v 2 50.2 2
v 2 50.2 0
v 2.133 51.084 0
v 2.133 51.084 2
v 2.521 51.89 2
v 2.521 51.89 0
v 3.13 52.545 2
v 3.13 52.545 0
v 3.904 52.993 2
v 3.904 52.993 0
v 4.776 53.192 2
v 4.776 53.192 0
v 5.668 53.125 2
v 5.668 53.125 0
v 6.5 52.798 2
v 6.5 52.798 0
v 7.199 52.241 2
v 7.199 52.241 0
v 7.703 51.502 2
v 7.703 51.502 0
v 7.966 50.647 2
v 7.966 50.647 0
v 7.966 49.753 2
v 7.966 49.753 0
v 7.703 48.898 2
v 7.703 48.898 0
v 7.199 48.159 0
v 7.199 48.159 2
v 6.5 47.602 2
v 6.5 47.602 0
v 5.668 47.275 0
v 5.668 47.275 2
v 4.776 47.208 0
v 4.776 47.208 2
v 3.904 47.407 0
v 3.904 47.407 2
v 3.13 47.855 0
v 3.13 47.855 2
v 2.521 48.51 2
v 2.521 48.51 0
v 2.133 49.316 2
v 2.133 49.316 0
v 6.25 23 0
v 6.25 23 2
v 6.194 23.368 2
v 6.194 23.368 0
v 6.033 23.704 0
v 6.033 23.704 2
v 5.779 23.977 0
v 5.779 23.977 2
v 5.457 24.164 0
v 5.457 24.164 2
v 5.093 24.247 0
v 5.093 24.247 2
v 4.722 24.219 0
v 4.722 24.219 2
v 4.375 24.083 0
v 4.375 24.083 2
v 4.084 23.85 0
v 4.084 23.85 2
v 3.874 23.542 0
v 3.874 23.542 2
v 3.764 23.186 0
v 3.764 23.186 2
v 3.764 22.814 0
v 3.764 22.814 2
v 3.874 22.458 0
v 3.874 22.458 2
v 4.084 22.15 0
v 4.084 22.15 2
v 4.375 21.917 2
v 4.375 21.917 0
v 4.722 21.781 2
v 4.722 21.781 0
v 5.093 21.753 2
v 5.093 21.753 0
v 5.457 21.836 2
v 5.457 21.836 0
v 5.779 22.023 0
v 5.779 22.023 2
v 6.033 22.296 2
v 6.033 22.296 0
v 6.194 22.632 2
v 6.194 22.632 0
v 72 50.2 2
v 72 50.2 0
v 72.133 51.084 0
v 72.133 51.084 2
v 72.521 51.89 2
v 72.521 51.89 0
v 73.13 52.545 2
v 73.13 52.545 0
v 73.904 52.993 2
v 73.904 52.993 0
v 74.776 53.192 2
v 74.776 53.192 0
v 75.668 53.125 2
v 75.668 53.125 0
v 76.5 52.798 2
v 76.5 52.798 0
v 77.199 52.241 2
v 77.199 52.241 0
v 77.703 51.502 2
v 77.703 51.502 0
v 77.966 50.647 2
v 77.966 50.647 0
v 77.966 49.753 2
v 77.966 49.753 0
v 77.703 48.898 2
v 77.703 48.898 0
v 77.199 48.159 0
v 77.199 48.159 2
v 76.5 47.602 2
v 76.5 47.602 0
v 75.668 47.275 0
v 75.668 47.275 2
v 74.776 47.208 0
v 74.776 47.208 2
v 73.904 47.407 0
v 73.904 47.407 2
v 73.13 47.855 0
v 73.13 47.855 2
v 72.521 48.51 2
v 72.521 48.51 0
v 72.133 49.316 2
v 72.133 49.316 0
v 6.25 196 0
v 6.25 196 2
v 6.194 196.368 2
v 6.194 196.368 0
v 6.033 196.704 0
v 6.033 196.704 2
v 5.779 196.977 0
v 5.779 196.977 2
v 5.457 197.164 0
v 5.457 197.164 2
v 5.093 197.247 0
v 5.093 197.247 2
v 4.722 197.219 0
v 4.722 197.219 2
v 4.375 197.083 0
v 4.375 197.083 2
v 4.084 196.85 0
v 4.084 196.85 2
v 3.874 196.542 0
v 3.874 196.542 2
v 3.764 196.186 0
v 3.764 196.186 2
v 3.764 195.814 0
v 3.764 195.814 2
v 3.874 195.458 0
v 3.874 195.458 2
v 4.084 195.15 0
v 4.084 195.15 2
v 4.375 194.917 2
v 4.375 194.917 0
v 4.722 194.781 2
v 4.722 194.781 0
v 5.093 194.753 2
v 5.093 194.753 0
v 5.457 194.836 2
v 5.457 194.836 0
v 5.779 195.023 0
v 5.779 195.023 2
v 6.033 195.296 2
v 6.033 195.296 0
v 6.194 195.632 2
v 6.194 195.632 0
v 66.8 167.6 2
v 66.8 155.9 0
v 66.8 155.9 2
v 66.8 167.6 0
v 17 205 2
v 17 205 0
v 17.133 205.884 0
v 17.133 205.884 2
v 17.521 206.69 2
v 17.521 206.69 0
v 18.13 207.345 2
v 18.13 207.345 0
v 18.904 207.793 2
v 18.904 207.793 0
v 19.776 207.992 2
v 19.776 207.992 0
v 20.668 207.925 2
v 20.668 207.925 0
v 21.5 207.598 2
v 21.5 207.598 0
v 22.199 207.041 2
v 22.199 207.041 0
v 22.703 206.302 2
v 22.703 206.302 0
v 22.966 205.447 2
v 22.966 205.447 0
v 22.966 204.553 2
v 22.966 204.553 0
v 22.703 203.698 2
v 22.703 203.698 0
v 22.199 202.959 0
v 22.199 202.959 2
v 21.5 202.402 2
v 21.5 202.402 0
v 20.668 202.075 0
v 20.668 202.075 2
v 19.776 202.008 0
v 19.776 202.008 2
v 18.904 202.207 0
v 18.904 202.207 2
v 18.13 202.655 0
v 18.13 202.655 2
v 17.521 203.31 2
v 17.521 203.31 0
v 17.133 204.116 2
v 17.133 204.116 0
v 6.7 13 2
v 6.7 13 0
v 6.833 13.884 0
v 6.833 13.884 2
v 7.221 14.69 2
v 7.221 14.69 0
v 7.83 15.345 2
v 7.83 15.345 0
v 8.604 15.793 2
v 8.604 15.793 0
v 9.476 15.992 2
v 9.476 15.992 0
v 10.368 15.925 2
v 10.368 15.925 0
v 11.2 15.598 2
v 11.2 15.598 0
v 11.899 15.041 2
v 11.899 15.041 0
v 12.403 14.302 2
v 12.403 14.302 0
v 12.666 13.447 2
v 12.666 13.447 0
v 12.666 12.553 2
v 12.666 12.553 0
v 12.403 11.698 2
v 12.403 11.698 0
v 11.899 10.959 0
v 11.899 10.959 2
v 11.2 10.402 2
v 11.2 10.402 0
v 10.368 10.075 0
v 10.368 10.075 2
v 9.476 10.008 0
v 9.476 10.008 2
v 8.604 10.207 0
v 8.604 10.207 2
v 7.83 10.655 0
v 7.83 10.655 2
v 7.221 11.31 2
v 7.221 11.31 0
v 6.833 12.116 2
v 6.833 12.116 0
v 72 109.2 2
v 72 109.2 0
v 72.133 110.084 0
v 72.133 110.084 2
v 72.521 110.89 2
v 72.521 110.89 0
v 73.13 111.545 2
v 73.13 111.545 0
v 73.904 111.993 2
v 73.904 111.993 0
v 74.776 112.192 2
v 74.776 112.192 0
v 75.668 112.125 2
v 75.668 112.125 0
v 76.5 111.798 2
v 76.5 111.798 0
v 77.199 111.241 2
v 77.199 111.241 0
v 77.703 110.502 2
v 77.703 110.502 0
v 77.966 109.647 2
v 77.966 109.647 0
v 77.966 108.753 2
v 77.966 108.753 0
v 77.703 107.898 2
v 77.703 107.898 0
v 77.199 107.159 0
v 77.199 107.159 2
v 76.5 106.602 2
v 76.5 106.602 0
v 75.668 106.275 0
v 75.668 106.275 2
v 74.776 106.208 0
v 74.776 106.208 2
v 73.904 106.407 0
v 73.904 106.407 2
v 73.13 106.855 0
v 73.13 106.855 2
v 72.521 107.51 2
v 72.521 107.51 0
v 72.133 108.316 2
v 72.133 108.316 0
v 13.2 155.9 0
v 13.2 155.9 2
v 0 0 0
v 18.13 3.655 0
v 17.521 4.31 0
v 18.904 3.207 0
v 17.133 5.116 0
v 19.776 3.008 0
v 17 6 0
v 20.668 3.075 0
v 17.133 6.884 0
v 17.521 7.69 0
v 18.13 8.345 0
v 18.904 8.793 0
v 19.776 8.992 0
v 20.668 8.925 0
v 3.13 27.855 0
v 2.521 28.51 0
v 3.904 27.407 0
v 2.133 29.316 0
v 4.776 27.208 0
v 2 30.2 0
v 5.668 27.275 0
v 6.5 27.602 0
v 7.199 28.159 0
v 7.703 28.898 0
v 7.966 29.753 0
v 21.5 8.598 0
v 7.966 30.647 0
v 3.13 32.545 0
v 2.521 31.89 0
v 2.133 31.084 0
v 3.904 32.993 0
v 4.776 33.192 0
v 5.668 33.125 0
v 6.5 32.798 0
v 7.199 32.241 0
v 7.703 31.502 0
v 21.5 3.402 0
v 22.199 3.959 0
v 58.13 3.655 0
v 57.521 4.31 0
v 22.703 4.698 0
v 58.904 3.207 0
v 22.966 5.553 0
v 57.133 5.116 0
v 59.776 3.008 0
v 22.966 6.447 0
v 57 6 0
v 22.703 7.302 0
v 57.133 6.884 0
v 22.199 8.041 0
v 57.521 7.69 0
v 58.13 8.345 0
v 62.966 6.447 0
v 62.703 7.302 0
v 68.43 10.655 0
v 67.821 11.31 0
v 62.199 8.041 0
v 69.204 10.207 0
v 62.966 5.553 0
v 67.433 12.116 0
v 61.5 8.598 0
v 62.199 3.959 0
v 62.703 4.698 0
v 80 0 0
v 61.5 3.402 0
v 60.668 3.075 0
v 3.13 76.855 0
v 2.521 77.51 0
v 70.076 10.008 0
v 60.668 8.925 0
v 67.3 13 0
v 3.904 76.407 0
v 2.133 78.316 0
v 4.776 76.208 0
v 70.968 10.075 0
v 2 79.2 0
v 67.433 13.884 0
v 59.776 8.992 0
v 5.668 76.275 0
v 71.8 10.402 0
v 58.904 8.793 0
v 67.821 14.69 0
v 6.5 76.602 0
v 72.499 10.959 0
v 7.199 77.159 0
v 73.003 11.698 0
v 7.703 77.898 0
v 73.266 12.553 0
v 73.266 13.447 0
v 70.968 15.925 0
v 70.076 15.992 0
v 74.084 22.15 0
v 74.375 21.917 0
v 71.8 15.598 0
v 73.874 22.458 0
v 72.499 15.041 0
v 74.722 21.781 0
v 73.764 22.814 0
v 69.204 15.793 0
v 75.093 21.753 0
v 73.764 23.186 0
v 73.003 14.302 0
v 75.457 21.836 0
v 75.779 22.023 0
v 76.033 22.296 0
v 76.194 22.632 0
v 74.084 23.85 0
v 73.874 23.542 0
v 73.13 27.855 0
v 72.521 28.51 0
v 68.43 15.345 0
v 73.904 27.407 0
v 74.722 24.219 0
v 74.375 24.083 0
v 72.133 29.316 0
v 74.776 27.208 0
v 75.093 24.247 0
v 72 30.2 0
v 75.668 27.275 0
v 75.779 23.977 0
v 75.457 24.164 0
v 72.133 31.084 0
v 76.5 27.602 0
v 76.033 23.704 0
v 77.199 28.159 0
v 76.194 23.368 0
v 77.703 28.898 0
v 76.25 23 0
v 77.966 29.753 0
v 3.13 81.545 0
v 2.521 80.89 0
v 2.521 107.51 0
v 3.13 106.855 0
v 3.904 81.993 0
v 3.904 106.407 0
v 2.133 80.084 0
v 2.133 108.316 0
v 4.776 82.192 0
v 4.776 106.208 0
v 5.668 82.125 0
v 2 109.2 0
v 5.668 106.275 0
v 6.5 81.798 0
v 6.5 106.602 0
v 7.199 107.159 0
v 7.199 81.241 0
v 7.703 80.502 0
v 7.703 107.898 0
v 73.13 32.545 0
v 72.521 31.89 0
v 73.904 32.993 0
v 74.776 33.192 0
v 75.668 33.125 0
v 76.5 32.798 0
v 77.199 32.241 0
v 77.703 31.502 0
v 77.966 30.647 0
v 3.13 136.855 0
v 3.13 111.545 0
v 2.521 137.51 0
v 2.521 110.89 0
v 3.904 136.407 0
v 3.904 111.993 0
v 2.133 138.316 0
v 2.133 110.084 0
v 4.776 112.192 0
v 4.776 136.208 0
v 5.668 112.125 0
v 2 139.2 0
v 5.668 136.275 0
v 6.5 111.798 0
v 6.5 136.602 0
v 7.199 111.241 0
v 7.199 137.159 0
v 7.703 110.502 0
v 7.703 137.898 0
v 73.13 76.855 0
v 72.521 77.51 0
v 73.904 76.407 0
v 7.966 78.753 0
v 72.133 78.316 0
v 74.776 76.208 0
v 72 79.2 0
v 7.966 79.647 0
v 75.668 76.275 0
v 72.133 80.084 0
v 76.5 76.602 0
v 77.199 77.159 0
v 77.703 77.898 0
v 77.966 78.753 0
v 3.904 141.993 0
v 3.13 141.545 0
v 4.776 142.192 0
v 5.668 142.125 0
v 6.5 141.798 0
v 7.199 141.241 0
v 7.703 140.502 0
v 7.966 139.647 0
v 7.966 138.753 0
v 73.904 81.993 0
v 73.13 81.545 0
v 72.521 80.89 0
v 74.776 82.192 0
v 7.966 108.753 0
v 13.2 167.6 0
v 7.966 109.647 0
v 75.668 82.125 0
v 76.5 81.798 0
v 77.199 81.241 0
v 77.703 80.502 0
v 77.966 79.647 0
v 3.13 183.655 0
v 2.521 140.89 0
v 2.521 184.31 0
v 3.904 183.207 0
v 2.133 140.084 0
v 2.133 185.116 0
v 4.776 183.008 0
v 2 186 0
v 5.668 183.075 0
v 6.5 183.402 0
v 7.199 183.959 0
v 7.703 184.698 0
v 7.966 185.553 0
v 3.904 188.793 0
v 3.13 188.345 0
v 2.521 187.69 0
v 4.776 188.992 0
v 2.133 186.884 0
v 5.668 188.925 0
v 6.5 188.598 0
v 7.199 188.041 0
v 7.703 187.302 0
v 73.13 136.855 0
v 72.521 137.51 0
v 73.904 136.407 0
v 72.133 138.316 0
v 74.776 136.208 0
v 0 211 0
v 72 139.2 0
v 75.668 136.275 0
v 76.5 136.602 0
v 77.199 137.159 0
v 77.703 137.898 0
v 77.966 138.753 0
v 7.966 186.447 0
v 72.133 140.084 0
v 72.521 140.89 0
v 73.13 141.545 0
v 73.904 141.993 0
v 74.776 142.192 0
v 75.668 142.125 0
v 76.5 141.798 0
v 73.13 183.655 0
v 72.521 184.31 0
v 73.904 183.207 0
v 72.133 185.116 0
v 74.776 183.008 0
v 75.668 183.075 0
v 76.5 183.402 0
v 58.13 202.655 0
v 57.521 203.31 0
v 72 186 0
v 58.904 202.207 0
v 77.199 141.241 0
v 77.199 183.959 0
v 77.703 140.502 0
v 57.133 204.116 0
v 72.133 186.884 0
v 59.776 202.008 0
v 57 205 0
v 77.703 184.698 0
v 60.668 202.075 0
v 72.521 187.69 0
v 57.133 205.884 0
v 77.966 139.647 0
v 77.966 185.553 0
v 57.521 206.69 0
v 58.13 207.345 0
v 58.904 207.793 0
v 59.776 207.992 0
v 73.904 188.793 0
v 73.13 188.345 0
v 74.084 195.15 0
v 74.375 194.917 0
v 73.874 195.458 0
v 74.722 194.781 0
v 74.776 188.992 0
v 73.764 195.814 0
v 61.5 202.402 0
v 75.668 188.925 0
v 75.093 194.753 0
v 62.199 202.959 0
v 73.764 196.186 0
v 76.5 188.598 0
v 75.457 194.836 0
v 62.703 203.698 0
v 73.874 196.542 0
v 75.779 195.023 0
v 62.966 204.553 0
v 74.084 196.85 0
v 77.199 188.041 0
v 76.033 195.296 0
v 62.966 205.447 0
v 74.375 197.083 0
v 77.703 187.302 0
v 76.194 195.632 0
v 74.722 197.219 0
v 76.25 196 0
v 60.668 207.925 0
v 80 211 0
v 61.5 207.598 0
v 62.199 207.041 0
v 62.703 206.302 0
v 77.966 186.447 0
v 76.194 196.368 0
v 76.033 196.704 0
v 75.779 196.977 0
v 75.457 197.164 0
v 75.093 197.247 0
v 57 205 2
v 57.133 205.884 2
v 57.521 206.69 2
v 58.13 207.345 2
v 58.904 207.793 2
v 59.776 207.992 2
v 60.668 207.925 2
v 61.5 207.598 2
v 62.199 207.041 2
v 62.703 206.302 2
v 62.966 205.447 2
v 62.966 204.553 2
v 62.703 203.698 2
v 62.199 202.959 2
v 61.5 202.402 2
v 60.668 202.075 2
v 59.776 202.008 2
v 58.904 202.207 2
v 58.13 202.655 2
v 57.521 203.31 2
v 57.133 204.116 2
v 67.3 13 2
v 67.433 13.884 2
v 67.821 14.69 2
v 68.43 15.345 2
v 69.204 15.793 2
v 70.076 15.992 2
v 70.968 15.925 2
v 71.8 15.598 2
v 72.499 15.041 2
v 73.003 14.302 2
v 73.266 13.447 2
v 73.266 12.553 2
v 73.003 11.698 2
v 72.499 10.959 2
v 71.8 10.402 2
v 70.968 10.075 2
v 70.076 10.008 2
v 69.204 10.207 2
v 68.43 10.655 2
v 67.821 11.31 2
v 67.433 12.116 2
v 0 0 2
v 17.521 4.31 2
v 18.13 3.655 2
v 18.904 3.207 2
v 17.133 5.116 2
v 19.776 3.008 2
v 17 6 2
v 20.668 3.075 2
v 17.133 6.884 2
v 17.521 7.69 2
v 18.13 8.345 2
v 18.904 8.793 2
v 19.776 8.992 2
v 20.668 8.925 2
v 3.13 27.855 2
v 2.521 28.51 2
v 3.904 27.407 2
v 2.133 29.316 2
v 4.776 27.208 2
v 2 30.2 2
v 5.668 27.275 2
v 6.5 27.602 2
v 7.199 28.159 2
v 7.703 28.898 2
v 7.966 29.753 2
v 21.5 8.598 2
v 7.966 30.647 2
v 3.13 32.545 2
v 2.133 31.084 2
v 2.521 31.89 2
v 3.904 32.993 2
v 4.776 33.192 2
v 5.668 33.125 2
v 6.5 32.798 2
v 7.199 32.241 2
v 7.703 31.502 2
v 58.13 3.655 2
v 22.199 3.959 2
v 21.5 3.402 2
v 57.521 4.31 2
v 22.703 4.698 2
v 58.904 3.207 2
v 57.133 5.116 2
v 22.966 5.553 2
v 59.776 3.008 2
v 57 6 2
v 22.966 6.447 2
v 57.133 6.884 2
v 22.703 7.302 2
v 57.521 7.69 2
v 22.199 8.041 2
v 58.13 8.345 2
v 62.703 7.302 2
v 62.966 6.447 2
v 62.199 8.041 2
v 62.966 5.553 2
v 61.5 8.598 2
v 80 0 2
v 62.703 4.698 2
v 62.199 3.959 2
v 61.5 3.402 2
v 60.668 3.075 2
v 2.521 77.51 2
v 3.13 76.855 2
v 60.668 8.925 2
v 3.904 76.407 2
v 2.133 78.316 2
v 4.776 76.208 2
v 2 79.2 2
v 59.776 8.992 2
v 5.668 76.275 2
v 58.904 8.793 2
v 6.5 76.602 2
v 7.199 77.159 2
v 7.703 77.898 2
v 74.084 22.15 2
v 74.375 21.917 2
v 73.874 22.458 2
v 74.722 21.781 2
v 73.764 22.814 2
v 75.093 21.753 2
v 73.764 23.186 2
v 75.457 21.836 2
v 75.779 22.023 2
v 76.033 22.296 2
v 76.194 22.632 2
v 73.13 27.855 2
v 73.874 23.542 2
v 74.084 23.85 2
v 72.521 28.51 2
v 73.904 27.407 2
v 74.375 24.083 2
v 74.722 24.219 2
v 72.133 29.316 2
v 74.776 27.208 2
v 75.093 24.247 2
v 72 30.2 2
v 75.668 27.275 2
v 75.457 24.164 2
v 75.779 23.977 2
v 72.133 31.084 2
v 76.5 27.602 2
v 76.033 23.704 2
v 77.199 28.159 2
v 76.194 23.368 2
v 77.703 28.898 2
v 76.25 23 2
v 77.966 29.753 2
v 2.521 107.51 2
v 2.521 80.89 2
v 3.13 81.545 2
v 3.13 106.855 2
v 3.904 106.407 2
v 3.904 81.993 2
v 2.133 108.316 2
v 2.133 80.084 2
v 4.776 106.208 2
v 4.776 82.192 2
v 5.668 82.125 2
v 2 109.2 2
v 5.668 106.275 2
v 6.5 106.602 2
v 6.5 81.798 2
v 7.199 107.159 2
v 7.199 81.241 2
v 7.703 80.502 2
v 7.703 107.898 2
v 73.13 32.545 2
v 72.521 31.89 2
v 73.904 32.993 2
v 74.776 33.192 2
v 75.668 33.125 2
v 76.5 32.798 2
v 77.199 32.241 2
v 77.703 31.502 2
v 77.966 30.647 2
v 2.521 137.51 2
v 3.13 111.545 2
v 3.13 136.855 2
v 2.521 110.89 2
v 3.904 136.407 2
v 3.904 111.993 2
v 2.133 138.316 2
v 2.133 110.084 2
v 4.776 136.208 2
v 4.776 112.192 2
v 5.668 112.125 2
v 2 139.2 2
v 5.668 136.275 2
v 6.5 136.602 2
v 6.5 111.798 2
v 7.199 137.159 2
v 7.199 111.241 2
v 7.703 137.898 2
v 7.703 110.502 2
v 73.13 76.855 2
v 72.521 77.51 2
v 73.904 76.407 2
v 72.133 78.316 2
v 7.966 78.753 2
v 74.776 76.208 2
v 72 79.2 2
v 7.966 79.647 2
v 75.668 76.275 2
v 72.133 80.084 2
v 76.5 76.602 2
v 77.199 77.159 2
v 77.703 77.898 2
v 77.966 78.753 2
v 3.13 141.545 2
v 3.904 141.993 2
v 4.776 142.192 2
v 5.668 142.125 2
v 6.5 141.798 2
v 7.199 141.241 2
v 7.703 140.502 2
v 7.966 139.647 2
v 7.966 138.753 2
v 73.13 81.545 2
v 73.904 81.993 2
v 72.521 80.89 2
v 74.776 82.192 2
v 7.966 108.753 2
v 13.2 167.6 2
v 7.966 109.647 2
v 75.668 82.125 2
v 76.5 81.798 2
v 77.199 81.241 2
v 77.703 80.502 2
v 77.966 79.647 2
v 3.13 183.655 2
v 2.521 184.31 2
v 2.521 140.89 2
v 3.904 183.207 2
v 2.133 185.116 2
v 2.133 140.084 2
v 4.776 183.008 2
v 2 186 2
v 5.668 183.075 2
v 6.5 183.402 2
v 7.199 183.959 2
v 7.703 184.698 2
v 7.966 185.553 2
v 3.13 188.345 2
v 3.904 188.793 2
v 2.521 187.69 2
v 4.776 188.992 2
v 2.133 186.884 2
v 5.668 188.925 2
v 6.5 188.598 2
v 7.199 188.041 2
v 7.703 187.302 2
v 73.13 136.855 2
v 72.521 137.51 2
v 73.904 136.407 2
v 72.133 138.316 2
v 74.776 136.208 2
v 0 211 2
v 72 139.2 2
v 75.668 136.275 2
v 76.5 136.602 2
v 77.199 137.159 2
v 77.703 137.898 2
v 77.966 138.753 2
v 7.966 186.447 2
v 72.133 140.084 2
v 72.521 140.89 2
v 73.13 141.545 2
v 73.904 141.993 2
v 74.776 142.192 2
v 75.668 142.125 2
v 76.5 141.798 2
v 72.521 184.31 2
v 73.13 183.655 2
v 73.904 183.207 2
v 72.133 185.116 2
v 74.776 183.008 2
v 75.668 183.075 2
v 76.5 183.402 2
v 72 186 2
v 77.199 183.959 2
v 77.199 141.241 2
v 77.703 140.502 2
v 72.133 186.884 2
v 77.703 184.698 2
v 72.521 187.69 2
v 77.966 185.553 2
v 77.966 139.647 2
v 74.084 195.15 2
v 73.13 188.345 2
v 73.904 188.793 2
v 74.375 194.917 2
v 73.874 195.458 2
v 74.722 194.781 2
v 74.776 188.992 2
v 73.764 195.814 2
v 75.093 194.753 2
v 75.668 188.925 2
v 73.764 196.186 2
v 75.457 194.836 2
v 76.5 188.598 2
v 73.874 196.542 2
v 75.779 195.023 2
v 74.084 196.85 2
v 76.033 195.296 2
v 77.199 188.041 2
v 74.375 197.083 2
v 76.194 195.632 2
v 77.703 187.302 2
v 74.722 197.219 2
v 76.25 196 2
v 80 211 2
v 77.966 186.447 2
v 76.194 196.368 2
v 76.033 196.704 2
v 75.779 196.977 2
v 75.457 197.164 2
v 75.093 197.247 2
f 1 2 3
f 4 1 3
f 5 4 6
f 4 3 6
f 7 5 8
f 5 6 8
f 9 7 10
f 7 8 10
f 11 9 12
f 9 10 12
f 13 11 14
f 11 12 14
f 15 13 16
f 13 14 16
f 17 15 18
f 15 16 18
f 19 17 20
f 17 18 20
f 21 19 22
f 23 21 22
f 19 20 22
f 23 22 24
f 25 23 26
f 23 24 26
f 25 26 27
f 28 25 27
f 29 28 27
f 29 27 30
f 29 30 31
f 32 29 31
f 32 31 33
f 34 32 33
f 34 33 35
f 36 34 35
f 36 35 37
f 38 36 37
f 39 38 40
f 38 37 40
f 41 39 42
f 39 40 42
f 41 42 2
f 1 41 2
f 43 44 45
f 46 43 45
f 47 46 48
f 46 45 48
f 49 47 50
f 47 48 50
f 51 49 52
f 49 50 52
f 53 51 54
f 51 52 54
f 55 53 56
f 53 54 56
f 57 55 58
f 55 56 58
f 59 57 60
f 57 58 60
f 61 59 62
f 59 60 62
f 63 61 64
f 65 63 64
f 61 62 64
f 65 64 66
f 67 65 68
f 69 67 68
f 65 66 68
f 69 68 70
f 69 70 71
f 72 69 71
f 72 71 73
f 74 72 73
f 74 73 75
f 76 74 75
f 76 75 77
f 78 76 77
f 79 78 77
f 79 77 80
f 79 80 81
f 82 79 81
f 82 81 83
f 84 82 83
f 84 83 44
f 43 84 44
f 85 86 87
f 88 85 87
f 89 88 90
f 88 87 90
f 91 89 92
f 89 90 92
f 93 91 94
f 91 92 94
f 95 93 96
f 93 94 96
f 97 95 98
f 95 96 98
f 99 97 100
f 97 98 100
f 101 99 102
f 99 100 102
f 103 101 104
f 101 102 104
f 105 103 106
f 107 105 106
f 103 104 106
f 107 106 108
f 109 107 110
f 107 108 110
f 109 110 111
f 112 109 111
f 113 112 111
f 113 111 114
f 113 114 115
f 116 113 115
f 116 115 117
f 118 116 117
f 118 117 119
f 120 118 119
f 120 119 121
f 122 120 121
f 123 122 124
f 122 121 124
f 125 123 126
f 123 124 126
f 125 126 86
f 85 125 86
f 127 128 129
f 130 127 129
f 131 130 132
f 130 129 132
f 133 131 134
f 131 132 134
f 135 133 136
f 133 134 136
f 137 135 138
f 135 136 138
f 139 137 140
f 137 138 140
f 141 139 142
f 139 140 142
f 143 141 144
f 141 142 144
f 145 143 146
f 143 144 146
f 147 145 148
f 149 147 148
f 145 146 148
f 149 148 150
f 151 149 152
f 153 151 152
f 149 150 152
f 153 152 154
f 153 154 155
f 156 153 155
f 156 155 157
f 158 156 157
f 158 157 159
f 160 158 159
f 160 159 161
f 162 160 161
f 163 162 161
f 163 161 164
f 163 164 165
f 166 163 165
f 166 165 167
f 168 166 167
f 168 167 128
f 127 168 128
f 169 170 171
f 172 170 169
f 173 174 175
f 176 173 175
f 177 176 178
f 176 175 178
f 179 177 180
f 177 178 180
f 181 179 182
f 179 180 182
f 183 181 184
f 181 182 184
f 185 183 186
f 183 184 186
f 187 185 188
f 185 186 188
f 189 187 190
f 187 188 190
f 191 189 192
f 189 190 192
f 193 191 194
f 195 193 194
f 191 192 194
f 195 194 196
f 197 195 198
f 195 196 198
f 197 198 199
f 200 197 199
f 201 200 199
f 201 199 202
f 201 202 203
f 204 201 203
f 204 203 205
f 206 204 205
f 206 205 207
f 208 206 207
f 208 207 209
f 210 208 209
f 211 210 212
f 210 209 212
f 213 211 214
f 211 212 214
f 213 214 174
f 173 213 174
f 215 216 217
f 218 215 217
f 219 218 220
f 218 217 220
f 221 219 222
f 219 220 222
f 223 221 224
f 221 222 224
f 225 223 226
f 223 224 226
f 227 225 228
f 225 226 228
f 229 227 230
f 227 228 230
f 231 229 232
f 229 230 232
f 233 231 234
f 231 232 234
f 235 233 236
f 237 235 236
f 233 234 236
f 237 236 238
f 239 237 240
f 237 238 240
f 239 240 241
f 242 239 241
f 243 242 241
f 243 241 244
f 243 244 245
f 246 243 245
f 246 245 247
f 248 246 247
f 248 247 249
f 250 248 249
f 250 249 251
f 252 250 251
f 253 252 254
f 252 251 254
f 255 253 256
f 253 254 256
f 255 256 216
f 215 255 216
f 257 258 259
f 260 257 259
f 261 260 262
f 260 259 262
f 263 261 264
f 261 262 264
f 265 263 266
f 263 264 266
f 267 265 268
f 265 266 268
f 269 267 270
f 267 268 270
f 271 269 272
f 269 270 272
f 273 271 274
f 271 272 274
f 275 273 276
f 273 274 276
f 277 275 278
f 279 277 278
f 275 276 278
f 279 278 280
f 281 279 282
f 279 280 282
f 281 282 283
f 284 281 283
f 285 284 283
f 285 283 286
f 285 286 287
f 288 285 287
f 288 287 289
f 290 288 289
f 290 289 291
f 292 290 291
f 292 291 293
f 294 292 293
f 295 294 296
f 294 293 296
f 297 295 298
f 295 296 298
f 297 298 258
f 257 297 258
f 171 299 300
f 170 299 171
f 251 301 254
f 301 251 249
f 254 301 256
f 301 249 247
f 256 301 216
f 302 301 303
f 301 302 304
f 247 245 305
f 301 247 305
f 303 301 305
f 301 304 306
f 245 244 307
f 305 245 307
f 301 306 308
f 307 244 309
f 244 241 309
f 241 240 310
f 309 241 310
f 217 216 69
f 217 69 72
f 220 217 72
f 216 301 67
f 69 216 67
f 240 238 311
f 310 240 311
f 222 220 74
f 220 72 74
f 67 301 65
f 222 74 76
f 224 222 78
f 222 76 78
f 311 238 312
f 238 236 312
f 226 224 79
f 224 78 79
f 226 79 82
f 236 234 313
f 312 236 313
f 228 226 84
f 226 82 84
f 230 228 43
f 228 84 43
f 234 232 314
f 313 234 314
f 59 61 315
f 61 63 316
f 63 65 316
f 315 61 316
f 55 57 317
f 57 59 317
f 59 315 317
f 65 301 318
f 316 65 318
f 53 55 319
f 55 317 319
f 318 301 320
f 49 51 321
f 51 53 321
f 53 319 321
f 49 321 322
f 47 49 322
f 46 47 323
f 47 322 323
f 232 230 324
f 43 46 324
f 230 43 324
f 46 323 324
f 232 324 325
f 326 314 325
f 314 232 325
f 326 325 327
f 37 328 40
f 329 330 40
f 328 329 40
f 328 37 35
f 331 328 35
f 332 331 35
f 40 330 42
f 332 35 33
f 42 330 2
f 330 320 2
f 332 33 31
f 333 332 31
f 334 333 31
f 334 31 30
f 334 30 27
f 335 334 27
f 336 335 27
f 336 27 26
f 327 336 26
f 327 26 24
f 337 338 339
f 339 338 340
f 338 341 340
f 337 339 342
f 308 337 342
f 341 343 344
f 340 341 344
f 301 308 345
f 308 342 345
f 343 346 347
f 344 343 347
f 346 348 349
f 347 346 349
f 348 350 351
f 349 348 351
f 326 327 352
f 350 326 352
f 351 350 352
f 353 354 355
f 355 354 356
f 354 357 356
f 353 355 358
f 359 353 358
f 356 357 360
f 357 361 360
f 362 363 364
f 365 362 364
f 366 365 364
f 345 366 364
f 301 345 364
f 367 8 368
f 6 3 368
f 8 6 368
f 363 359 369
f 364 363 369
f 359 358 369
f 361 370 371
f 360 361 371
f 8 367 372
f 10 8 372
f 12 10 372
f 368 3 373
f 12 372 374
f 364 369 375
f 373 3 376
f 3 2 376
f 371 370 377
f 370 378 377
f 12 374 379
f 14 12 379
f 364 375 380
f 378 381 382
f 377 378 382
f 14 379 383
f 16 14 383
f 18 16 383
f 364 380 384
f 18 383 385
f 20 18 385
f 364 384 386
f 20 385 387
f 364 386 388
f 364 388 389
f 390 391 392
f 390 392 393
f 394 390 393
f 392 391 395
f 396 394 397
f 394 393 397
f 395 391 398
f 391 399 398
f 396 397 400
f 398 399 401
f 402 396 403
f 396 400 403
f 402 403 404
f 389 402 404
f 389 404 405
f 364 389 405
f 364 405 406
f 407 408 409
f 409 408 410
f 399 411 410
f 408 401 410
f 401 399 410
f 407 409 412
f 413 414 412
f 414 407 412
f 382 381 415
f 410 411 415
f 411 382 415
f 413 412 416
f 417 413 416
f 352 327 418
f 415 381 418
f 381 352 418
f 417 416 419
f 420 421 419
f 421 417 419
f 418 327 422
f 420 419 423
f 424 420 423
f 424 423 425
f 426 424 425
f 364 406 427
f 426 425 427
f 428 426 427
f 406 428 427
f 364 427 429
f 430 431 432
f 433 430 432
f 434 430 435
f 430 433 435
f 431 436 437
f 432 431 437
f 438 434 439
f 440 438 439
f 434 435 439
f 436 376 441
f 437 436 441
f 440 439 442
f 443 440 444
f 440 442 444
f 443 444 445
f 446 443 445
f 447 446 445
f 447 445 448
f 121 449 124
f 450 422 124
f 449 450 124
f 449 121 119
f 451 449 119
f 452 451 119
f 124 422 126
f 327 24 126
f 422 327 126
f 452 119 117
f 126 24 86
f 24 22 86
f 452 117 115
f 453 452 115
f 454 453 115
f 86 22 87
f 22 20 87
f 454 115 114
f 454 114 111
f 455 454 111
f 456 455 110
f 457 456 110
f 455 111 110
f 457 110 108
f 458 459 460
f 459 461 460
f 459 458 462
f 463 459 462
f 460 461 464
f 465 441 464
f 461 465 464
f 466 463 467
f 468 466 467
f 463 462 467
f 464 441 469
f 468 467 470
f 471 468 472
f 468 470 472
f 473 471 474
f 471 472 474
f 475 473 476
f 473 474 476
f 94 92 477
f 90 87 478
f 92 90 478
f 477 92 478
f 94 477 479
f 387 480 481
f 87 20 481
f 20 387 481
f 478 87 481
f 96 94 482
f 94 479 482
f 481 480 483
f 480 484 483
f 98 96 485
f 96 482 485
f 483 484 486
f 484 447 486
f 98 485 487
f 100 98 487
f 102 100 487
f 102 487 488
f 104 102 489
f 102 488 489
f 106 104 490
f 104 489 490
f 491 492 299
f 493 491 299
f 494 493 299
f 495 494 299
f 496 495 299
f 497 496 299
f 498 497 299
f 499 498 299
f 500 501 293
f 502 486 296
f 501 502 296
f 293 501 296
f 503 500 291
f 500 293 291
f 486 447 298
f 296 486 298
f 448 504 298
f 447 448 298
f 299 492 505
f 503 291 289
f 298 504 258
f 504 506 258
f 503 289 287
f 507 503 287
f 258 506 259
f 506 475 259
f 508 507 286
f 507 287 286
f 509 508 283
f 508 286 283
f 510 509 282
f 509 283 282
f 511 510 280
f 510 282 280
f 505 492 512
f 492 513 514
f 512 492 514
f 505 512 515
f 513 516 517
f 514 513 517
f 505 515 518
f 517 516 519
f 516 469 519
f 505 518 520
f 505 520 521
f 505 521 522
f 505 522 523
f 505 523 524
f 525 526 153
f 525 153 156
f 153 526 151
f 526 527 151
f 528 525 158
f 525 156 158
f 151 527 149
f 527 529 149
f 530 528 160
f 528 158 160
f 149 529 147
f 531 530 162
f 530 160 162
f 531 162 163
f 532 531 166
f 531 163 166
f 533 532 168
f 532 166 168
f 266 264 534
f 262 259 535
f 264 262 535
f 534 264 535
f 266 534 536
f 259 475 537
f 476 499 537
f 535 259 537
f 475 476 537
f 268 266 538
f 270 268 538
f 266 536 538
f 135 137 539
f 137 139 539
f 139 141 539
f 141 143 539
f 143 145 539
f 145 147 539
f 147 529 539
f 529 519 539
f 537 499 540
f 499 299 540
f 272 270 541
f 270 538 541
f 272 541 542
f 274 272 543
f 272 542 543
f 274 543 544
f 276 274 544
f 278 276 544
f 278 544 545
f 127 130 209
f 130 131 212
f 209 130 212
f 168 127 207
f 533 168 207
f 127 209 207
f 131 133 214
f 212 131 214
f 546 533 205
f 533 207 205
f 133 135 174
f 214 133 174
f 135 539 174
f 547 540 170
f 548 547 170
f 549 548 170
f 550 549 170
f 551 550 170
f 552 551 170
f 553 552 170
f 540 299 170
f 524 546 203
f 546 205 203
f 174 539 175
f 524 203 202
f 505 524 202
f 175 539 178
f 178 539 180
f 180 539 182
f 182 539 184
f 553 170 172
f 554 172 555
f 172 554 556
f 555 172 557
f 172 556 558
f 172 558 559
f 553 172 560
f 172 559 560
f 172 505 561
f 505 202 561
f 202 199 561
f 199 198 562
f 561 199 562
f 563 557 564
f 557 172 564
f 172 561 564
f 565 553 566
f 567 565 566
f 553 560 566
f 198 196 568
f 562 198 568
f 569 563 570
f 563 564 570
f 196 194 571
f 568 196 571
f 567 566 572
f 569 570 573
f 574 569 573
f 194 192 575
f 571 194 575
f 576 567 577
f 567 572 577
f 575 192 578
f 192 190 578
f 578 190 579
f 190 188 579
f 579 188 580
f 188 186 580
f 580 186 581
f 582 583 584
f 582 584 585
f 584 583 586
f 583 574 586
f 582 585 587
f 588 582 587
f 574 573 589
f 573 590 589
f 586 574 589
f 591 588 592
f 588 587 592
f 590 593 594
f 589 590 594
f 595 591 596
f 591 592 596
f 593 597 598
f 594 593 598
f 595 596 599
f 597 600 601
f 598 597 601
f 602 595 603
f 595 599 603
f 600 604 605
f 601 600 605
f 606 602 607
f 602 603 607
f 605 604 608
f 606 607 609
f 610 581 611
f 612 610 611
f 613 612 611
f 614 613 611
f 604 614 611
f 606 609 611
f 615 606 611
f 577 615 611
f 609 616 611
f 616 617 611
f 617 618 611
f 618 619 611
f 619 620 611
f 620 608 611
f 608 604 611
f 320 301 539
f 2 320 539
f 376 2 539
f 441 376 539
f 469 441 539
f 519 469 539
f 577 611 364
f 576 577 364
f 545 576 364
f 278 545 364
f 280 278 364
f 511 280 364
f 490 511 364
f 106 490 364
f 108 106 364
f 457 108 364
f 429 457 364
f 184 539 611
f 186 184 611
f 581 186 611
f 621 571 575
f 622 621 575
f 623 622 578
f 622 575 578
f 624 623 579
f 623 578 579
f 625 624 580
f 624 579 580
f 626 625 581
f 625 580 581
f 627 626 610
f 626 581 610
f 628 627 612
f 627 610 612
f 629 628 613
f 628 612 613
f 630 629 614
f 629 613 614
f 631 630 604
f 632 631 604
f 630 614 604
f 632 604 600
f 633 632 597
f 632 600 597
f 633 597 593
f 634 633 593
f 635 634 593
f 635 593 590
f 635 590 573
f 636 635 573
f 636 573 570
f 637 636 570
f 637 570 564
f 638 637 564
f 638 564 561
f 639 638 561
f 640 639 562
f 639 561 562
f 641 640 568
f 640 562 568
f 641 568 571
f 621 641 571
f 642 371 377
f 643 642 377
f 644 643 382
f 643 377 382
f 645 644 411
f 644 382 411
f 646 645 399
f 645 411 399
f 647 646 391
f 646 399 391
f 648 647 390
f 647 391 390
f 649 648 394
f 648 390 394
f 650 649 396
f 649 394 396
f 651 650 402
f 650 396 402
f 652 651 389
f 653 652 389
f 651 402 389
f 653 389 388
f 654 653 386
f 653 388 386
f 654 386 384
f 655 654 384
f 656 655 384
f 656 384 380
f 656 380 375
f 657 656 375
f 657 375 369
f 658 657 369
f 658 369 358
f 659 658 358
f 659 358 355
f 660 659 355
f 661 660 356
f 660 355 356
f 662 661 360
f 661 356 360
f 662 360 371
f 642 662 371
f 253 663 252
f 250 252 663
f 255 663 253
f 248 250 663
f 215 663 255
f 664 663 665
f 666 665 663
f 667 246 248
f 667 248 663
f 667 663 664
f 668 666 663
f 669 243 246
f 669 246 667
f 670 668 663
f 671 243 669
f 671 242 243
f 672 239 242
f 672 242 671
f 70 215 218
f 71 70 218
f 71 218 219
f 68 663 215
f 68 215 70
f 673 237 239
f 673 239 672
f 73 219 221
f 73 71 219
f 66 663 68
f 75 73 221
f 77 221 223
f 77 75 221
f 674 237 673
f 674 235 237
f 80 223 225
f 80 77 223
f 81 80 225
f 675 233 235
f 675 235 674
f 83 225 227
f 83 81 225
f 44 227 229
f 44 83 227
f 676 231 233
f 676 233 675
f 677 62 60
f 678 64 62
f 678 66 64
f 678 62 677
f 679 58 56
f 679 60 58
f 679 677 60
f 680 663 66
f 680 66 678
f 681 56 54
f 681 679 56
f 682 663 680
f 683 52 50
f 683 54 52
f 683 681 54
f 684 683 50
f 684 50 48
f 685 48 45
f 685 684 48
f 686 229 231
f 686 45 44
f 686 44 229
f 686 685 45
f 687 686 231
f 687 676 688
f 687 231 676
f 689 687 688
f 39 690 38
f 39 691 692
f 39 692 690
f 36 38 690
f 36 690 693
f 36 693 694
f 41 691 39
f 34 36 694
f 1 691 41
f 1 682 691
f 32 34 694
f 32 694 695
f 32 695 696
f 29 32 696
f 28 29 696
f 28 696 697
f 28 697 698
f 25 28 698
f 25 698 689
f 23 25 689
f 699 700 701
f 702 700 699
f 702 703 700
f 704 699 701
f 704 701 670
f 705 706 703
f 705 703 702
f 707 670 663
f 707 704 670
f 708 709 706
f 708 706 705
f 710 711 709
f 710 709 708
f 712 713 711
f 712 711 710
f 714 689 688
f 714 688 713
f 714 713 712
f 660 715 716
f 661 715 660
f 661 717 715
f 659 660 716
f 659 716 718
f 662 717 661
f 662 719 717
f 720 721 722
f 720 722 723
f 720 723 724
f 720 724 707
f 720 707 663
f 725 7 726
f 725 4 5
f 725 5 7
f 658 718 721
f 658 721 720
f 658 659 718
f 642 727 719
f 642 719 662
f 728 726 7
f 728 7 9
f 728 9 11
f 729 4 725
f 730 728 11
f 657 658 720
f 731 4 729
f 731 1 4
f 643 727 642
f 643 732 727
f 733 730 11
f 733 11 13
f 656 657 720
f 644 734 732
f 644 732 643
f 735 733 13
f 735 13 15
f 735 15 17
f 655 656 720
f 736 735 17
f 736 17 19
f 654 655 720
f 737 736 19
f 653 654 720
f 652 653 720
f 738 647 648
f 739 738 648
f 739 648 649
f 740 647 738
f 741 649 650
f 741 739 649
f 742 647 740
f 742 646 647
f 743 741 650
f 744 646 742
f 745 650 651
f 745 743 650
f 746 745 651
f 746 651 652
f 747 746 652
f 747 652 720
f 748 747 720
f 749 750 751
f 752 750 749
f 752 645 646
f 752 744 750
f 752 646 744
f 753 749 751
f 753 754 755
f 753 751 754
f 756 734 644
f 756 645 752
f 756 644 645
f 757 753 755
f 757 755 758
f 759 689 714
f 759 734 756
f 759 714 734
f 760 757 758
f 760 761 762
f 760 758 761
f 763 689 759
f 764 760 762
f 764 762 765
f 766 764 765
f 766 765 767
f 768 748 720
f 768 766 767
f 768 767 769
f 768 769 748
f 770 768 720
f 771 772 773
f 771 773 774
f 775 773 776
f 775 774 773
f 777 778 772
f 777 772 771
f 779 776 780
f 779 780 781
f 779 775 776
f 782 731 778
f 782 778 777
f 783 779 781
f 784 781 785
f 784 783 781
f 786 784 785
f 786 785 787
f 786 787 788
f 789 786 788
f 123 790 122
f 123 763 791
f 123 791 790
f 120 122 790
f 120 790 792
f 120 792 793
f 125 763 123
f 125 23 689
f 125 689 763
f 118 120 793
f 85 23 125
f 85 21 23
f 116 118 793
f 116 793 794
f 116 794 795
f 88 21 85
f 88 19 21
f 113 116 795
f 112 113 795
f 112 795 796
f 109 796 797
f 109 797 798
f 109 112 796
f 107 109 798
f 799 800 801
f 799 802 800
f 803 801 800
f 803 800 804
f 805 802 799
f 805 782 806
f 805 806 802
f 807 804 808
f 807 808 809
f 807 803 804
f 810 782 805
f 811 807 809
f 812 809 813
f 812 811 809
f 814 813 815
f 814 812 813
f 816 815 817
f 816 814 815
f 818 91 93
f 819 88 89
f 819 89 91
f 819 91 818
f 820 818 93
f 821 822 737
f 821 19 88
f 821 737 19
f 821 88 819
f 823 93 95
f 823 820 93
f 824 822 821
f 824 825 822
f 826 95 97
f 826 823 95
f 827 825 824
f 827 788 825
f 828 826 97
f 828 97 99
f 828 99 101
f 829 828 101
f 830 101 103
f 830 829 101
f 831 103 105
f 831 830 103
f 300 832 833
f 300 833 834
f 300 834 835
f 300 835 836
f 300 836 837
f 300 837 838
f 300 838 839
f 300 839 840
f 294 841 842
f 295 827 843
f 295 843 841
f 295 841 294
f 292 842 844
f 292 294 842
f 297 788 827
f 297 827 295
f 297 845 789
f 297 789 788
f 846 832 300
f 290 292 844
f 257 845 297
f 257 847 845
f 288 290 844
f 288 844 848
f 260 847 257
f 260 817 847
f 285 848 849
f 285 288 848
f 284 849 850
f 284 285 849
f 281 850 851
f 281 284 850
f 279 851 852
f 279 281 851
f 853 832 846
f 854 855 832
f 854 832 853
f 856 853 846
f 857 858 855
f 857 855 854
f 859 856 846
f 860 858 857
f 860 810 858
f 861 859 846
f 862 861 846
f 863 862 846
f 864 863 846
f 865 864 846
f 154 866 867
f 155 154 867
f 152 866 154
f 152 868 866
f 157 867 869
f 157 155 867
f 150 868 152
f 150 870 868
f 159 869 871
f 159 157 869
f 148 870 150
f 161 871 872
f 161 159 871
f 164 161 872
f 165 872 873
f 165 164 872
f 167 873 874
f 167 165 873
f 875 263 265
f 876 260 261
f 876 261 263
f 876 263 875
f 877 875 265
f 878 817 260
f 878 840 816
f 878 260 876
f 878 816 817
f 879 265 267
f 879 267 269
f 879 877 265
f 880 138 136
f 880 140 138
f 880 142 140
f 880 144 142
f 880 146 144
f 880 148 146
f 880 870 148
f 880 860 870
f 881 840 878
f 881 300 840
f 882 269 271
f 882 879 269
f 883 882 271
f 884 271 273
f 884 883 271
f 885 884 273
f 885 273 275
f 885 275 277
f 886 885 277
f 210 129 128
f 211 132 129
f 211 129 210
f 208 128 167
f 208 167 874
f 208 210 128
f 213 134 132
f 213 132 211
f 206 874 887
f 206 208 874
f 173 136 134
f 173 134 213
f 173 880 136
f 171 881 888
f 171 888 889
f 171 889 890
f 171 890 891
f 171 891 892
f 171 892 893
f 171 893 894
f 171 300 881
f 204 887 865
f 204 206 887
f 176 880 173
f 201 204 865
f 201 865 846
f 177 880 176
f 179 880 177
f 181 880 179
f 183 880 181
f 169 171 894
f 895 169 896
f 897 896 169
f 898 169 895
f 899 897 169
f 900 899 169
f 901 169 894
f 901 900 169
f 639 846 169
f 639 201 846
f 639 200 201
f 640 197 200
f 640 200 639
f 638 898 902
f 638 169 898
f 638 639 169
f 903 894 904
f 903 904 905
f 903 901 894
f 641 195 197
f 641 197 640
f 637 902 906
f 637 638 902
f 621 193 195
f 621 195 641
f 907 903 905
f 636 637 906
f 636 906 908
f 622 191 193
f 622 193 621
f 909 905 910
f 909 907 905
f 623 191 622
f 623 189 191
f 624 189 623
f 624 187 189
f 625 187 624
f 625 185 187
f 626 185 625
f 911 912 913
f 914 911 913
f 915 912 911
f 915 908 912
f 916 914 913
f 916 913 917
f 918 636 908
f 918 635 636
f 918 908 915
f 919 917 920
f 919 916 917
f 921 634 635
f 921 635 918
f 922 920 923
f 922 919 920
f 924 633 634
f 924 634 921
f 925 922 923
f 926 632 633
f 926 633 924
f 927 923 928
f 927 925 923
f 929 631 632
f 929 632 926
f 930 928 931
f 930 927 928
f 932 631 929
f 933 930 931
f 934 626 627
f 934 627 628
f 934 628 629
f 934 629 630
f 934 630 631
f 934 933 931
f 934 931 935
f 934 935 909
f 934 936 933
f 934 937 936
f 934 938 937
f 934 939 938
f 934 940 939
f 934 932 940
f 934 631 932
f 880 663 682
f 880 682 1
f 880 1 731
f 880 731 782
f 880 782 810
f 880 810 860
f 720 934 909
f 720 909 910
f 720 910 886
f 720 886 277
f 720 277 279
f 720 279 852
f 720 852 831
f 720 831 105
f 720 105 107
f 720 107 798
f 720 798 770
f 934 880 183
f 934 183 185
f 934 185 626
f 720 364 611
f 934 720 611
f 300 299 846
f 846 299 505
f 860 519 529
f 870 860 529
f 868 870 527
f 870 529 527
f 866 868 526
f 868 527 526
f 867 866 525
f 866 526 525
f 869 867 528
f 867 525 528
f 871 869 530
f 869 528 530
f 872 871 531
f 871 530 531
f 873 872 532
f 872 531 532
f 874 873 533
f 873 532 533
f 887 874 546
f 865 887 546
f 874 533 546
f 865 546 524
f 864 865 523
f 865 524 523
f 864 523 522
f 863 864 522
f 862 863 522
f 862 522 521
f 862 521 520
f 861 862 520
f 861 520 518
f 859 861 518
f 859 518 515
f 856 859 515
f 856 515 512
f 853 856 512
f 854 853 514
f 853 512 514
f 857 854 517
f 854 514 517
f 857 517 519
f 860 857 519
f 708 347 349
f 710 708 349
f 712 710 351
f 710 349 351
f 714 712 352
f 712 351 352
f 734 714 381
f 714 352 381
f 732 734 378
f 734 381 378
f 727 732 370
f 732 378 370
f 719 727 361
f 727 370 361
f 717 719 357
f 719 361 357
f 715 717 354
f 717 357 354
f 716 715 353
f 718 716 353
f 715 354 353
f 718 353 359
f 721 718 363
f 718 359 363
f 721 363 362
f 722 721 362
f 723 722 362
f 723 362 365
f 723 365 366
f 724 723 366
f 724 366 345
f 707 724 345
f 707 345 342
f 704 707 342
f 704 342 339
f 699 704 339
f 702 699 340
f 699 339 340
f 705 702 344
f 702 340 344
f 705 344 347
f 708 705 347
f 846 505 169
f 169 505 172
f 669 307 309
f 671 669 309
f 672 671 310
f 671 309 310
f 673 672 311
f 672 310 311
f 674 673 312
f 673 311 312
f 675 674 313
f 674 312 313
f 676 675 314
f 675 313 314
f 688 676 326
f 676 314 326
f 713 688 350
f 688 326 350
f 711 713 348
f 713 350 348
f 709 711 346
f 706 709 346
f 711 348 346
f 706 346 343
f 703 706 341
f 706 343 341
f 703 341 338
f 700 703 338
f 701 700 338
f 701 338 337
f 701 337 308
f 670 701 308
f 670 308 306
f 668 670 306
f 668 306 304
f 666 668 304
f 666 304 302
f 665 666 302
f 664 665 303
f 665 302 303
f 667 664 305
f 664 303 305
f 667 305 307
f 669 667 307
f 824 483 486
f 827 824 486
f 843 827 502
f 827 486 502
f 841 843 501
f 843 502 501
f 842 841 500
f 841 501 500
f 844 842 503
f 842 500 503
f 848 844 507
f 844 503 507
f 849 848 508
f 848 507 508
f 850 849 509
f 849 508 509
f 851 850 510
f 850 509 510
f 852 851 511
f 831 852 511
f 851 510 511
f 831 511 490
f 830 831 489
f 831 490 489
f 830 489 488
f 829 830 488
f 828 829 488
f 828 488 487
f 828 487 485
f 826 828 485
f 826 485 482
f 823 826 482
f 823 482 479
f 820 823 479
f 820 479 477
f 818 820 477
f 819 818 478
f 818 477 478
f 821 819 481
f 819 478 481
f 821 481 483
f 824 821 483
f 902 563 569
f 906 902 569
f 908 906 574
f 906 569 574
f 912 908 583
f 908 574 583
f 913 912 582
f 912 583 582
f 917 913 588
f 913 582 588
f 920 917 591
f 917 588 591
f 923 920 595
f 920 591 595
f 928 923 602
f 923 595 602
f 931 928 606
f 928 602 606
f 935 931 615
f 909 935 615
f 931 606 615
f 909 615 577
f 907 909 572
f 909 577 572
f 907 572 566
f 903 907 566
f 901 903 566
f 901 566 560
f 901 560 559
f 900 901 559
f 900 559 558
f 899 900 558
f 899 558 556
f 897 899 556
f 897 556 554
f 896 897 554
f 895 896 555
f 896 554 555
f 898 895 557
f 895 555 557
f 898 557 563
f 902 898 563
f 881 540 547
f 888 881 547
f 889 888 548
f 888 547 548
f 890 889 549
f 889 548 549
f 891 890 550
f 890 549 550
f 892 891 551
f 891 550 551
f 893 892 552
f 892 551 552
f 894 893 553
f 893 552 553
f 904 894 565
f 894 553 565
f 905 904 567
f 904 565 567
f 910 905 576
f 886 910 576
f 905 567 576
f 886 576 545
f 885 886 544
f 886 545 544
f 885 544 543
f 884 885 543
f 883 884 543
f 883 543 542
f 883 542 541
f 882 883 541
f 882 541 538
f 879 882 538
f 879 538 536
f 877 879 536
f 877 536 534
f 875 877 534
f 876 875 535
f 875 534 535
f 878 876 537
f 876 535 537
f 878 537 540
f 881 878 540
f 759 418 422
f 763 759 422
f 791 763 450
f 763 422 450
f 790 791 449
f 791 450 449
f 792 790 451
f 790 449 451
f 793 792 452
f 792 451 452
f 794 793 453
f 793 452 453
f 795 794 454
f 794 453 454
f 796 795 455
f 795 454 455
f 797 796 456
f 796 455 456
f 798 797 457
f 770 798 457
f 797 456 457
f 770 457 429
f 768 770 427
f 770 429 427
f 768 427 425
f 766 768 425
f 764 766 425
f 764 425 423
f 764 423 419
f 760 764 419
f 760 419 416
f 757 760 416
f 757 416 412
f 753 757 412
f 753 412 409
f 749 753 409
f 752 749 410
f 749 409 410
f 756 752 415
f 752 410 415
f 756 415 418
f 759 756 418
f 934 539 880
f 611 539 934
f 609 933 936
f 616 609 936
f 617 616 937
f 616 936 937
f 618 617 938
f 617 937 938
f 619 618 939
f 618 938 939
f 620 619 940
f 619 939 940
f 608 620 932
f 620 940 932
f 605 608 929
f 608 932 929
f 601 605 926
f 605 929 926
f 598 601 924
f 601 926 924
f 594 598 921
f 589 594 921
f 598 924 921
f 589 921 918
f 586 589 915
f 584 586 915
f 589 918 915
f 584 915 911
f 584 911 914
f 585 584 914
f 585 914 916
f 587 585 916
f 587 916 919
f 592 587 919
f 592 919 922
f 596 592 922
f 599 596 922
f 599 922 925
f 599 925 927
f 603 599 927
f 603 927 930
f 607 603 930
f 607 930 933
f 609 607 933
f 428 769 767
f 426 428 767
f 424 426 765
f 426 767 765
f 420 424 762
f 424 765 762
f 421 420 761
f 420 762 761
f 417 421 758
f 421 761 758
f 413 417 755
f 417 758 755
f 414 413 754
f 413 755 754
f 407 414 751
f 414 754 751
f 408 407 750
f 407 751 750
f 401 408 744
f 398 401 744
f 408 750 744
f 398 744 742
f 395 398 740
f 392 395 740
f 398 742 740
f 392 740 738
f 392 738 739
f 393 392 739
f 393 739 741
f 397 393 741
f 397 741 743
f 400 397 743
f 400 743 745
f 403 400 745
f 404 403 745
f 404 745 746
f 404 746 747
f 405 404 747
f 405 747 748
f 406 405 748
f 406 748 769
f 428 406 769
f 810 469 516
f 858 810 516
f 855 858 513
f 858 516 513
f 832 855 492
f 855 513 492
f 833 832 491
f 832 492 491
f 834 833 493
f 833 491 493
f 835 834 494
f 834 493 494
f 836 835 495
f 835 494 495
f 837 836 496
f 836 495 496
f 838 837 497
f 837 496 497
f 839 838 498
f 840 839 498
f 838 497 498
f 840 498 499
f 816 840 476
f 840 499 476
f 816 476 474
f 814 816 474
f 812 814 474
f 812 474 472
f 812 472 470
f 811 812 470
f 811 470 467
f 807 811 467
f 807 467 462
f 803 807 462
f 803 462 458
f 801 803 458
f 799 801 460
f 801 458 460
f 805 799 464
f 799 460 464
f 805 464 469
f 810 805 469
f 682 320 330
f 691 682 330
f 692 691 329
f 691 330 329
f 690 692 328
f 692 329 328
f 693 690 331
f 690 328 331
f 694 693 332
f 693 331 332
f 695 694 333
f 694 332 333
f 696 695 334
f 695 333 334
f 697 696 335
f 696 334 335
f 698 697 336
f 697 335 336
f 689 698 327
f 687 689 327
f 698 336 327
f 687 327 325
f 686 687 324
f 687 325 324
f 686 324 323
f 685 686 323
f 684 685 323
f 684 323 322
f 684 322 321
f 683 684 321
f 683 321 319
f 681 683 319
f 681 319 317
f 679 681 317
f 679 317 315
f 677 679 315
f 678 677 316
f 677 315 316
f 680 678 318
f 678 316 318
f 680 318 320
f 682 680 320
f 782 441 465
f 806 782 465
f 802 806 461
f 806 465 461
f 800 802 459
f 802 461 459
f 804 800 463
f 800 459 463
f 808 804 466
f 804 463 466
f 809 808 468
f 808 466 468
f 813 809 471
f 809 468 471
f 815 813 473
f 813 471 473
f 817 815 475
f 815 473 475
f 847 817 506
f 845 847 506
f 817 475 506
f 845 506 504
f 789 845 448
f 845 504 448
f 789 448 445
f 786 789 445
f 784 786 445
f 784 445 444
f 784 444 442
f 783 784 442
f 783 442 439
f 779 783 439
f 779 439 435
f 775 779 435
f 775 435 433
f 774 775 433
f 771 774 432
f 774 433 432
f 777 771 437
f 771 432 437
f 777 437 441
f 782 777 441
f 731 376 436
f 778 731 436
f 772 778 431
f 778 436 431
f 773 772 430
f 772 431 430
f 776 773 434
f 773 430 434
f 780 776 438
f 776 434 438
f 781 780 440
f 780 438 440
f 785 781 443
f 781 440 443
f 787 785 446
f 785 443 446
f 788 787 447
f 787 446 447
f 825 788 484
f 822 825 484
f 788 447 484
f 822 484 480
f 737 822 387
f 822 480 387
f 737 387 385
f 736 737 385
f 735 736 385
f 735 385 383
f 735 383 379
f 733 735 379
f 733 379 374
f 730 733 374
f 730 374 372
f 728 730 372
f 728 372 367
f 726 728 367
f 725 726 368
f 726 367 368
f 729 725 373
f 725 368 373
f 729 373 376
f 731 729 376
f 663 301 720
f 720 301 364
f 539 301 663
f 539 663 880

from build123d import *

# Parameters (mm, degrees)
SKETCH2_W                 = 80
SKETCH2_H                 = 211
SKETCH2_W_2               = 53.6
SKETCH2_H_2               = 11.7
BOSS_EXTRUDE1_DEPTH       = 2
M3X0_5_TAPPED_HOLE1_D     = 2.5
M3X0_5_TAPPED_HOLE1_DEPTH = 10
M3X0_5_TAPPED_HOLE1_TIP   = 0.751075774
SKETCH7_R                 = 3
CUT_EXTRUDE1_DEPTH        = 2


with BuildPart() as part:
    # Sketch2 → Boss-Extrude1 (new body)
    with BuildSketch(Plane.XY):
        with Locations((40, 105.5)):
            Rectangle(SKETCH2_W, SKETCH2_H)
        with Locations((40, 161.75)):
            Rectangle(SKETCH2_W_2, SKETCH2_H_2, mode=Mode.SUBTRACT)
    extrude(amount=BOSS_EXTRUDE1_DEPTH)

    # M3x0.5 Tapped Hole1
    with Locations(Plane(origin=(0, 0, 0), x_dir=(-1, 0, 0), z_dir=(0, 0, -1))):
        with Locations((-75, 196), (-5, 196), (-75, 23), (-5, 23)):
            Hole(M3X0_5_TAPPED_HOLE1_D / 2, depth=M3X0_5_TAPPED_HOLE1_DEPTH)
            with Locations((0, 0, -(M3X0_5_TAPPED_HOLE1_DEPTH + M3X0_5_TAPPED_HOLE1_TIP / 2))):  # 118° drill point
                Cone(0, M3X0_5_TAPPED_HOLE1_D / 2, M3X0_5_TAPPED_HOLE1_TIP, mode=Mode.SUBTRACT)

    # Sketch7 → Cut-Extrude1 (cut)
    with BuildSketch(Plane(origin=(0, 0, 0), x_dir=(-1, 0, 0), z_dir=(0, 0, -1))):
        with Locations((-75, 186)):
            Circle(SKETCH7_R)
        with Locations((-75, 139.2)):
            Circle(SKETCH7_R)
        with Locations((-75, 109.2)):
            Circle(SKETCH7_R)
        with Locations((-75, 79.2)):
            Circle(SKETCH7_R)
        with Locations((-75, 50.2)):
            Circle(SKETCH7_R)
        with Locations((-75, 30.2)):
            Circle(SKETCH7_R)
        with Locations((-5, 186)):
            Circle(SKETCH7_R)
        with Locations((-5, 139.2)):
            Circle(SKETCH7_R)
        with Locations((-5, 109.2)):
            Circle(SKETCH7_R)
        with Locations((-5, 79.2)):
            Circle(SKETCH7_R)
        with Locations((-5, 50.2)):
            Circle(SKETCH7_R)
        with Locations((-5, 30.2)):
            Circle(SKETCH7_R)
        with Locations((-70.3, 13)):
            Circle(SKETCH7_R)
        with Locations((-60, 205)):
            Circle(SKETCH7_R)
        with Locations((-20, 205)):
            Circle(SKETCH7_R)
        with Locations((-60, 6)):
            Circle(SKETCH7_R)
        with Locations((-20, 6)):
            Circle(SKETCH7_R)
        with Locations((-9.7, 13)):
            Circle(SKETCH7_R)
    extrude(amount=-CUT_EXTRUDE1_DEPTH, mode=Mode.SUBTRACT)


solid = part.part
